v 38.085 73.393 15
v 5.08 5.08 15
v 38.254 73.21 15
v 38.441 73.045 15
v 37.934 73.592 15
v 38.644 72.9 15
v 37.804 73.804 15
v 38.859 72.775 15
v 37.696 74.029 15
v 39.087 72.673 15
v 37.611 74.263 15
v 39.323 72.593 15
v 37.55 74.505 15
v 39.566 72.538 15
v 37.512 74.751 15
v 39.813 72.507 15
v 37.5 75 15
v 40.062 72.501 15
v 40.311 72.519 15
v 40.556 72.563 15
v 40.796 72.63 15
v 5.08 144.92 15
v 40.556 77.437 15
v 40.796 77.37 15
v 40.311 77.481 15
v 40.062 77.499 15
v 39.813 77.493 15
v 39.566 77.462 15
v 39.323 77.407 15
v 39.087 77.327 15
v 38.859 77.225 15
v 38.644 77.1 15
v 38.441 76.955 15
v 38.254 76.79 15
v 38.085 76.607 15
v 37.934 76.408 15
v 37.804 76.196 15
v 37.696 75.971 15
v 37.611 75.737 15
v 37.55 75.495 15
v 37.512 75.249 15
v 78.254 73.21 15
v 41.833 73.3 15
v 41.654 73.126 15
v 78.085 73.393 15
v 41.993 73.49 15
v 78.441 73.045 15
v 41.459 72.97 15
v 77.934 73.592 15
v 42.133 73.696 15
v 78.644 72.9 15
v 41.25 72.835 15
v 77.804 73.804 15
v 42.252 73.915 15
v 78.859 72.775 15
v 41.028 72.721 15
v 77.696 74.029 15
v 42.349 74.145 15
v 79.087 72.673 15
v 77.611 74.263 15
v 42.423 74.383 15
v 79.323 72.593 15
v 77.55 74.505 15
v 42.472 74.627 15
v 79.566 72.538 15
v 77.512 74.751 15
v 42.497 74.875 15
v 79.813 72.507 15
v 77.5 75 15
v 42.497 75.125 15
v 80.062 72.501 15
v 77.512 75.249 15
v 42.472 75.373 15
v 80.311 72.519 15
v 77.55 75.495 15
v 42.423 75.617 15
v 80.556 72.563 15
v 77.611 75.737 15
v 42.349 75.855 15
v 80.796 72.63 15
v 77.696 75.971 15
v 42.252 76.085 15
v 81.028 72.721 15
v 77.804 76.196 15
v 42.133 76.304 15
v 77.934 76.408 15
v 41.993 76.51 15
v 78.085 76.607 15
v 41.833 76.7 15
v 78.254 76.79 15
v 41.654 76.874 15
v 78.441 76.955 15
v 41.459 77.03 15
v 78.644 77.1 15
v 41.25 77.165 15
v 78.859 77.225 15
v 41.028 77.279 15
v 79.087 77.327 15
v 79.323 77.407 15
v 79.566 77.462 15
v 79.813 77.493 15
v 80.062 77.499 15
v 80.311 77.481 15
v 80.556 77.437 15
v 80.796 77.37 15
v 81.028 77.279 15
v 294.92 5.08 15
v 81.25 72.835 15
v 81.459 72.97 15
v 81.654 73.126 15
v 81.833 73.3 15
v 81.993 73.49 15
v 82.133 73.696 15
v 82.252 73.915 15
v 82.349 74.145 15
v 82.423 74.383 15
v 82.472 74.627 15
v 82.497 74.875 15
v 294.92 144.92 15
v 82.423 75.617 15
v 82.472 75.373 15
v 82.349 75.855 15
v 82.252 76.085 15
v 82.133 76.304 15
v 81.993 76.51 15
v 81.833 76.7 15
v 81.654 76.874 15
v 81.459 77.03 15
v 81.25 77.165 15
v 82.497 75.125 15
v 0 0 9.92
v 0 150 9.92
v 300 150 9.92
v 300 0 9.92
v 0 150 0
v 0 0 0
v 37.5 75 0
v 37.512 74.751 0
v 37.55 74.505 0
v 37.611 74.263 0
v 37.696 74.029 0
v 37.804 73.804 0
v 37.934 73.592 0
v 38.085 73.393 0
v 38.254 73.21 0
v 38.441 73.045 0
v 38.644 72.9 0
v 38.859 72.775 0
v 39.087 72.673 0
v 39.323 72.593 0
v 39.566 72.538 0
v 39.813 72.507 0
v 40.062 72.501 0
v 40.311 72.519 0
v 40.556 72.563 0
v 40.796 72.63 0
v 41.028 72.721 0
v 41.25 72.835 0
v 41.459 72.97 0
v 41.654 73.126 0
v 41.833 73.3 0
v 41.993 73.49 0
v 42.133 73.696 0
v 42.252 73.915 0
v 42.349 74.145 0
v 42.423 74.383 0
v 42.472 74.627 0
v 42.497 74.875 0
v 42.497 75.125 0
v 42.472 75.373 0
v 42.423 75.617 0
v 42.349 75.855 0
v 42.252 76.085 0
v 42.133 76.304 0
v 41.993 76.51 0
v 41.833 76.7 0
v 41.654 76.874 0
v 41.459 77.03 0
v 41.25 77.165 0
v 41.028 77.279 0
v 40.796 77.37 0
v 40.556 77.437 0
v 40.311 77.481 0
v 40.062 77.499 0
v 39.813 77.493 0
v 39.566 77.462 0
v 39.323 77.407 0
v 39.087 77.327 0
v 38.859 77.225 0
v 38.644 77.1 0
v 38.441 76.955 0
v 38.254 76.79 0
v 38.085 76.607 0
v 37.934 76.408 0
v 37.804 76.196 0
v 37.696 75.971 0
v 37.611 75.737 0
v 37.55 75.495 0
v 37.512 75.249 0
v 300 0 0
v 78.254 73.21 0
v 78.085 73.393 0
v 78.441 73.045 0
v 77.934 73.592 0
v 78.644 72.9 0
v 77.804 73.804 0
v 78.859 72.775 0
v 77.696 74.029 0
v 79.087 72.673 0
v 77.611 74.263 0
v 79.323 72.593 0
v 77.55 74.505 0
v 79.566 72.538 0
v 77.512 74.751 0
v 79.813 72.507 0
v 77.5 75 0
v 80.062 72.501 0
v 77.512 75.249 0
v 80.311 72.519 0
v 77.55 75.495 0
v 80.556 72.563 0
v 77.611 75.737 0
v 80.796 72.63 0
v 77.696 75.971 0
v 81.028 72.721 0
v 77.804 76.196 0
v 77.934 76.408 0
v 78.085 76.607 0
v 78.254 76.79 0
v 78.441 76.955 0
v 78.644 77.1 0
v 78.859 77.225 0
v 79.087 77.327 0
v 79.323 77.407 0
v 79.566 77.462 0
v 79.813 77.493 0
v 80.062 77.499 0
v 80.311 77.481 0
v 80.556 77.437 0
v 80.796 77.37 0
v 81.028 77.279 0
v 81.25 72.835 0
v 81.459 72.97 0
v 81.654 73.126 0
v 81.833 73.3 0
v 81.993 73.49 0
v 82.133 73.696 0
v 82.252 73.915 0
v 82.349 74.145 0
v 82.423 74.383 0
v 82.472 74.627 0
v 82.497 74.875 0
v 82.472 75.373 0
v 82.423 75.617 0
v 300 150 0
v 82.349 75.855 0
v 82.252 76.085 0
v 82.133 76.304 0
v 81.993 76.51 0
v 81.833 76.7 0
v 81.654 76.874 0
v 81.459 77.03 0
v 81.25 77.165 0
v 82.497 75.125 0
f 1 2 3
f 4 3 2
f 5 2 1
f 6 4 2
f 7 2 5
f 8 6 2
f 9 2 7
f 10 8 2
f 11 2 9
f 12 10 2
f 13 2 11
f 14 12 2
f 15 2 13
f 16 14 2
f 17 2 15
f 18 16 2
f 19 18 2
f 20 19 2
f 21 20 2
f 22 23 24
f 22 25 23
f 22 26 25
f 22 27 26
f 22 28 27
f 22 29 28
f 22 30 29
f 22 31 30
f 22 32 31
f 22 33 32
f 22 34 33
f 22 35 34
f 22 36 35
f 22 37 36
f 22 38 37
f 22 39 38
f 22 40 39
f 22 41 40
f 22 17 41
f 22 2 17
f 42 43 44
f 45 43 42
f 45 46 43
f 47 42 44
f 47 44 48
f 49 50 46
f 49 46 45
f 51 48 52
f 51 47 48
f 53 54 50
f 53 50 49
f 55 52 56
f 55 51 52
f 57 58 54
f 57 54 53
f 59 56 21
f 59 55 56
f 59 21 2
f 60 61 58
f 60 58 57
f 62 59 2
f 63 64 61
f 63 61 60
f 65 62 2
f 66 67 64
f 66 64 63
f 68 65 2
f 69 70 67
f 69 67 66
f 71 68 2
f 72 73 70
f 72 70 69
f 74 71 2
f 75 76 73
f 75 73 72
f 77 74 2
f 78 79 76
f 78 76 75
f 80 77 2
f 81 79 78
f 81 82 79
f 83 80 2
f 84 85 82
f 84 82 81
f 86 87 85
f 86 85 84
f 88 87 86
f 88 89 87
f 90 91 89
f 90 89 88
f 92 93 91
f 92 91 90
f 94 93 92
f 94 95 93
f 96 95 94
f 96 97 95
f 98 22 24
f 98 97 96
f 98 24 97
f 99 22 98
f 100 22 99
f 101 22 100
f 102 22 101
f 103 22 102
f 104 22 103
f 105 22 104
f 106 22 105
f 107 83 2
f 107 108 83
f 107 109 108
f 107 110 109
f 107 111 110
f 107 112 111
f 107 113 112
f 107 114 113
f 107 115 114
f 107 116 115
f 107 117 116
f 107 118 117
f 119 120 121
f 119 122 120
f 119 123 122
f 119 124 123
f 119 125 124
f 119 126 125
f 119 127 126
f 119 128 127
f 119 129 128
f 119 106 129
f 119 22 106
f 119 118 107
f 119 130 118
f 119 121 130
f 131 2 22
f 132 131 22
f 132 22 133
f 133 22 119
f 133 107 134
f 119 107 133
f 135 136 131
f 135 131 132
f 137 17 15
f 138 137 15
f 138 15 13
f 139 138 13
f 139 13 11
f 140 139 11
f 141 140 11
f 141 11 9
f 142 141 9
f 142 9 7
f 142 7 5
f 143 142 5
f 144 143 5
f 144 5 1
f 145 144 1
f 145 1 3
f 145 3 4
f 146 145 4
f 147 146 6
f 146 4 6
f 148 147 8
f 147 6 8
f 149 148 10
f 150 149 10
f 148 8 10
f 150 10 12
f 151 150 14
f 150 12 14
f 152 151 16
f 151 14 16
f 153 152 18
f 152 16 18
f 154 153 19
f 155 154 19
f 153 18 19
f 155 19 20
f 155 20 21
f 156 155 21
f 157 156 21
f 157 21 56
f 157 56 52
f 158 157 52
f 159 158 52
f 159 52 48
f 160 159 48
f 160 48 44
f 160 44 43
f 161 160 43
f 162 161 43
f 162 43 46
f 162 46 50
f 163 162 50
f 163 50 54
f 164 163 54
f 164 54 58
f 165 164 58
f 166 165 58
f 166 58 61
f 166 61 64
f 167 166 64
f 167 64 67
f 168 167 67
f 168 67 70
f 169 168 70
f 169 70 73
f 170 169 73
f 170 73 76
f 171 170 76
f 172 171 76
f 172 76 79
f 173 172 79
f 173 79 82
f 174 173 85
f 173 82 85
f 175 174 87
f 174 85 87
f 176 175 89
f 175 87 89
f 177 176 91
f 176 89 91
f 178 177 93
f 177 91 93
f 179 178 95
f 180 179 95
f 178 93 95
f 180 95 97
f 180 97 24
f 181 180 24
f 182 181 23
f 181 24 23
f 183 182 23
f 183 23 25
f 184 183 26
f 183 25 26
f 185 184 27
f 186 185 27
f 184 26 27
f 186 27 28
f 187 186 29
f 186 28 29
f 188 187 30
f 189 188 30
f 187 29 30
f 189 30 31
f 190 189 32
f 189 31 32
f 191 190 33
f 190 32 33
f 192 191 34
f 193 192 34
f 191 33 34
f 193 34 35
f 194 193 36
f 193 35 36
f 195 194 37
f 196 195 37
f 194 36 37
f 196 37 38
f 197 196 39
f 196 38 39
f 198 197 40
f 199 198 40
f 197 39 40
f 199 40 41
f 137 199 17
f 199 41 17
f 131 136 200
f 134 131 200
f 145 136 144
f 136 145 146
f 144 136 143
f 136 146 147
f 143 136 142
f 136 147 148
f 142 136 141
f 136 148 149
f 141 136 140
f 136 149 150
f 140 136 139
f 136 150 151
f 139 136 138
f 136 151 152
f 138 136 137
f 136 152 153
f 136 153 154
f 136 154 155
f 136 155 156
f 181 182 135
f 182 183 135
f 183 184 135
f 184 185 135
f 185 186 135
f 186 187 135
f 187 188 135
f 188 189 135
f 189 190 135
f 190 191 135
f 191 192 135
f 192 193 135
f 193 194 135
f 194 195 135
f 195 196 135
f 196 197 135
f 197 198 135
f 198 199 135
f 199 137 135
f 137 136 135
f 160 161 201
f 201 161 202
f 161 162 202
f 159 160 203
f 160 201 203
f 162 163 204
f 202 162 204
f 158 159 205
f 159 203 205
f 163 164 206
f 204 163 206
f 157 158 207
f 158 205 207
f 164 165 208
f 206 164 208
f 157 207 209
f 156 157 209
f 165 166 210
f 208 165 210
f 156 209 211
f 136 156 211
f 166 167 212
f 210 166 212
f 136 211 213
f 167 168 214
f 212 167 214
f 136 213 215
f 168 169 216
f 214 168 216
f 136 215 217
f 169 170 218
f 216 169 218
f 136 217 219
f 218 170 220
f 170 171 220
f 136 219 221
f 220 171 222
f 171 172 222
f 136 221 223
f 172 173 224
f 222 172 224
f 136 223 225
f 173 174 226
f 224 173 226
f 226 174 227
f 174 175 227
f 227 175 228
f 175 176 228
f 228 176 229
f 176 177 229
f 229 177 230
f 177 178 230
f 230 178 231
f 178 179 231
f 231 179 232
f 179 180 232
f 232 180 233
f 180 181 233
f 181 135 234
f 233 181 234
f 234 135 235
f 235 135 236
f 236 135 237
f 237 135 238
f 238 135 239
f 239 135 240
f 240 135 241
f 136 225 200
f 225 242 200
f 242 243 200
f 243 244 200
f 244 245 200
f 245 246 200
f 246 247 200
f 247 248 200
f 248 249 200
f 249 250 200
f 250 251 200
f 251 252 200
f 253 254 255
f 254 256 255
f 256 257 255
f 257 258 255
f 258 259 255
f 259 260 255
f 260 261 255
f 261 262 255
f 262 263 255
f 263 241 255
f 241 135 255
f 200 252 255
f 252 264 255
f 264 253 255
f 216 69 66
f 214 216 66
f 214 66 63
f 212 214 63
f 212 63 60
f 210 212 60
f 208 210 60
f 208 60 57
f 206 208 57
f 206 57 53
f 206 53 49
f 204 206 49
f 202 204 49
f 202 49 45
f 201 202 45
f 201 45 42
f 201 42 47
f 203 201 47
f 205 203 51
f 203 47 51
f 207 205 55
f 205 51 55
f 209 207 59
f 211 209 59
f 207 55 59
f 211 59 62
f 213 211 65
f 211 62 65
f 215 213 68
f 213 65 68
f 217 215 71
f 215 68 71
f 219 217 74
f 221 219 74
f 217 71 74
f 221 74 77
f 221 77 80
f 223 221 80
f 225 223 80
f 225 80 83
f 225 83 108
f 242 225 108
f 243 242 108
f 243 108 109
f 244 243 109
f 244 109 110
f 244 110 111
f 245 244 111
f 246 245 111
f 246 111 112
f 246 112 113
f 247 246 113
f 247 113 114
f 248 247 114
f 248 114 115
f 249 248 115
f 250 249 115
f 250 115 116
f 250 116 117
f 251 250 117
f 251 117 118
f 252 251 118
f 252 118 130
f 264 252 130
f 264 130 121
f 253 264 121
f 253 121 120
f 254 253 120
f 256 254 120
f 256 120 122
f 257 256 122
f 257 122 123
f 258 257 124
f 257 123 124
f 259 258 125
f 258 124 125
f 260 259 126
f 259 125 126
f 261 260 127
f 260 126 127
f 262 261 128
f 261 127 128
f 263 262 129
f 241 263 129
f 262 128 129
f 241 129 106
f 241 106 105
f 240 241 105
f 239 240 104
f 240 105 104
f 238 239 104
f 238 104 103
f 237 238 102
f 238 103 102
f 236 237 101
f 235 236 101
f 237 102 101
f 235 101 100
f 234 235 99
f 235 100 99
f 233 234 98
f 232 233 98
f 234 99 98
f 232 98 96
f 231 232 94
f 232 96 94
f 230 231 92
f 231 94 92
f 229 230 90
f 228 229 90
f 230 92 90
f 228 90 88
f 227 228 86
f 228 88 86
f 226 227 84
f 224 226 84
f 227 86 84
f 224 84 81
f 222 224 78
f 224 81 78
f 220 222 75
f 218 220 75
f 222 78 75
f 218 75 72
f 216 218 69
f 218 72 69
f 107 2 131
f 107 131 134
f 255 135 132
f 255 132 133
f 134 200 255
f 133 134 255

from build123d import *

# Parameters (mm, degrees)
F0_W     = 300
F0_H     = 150
F1_DEPTH = 15
F2_SIZE  = 5.08
F4_D     = 5


with BuildPart() as f1:
    # F0 (on Top) → F1 (new body)
    with BuildSketch(Plane.XY):
        with Locations((150, 75)):
            Rectangle(F0_W, F0_H)
    extrude(amount=F1_DEPTH)

    # F2
    f2_edges = [f1.edges().sort_by_distance(p)[0] for p in [
        (150, 0, 15),
        (300, 75, 15),
        (150, 150, 15),
        (0, 75, 15),
    ]]
    chamfer(f2_edges, length=F2_SIZE)

    # F4 (through all)
    with Locations(Plane(origin=(0, 0, 0), x_dir=(1, 0, 0), z_dir=(0, 0, -1))):
        with Locations((40, -75), (80, -75)):
            Hole(F4_D / 2)


solid = f1.part
